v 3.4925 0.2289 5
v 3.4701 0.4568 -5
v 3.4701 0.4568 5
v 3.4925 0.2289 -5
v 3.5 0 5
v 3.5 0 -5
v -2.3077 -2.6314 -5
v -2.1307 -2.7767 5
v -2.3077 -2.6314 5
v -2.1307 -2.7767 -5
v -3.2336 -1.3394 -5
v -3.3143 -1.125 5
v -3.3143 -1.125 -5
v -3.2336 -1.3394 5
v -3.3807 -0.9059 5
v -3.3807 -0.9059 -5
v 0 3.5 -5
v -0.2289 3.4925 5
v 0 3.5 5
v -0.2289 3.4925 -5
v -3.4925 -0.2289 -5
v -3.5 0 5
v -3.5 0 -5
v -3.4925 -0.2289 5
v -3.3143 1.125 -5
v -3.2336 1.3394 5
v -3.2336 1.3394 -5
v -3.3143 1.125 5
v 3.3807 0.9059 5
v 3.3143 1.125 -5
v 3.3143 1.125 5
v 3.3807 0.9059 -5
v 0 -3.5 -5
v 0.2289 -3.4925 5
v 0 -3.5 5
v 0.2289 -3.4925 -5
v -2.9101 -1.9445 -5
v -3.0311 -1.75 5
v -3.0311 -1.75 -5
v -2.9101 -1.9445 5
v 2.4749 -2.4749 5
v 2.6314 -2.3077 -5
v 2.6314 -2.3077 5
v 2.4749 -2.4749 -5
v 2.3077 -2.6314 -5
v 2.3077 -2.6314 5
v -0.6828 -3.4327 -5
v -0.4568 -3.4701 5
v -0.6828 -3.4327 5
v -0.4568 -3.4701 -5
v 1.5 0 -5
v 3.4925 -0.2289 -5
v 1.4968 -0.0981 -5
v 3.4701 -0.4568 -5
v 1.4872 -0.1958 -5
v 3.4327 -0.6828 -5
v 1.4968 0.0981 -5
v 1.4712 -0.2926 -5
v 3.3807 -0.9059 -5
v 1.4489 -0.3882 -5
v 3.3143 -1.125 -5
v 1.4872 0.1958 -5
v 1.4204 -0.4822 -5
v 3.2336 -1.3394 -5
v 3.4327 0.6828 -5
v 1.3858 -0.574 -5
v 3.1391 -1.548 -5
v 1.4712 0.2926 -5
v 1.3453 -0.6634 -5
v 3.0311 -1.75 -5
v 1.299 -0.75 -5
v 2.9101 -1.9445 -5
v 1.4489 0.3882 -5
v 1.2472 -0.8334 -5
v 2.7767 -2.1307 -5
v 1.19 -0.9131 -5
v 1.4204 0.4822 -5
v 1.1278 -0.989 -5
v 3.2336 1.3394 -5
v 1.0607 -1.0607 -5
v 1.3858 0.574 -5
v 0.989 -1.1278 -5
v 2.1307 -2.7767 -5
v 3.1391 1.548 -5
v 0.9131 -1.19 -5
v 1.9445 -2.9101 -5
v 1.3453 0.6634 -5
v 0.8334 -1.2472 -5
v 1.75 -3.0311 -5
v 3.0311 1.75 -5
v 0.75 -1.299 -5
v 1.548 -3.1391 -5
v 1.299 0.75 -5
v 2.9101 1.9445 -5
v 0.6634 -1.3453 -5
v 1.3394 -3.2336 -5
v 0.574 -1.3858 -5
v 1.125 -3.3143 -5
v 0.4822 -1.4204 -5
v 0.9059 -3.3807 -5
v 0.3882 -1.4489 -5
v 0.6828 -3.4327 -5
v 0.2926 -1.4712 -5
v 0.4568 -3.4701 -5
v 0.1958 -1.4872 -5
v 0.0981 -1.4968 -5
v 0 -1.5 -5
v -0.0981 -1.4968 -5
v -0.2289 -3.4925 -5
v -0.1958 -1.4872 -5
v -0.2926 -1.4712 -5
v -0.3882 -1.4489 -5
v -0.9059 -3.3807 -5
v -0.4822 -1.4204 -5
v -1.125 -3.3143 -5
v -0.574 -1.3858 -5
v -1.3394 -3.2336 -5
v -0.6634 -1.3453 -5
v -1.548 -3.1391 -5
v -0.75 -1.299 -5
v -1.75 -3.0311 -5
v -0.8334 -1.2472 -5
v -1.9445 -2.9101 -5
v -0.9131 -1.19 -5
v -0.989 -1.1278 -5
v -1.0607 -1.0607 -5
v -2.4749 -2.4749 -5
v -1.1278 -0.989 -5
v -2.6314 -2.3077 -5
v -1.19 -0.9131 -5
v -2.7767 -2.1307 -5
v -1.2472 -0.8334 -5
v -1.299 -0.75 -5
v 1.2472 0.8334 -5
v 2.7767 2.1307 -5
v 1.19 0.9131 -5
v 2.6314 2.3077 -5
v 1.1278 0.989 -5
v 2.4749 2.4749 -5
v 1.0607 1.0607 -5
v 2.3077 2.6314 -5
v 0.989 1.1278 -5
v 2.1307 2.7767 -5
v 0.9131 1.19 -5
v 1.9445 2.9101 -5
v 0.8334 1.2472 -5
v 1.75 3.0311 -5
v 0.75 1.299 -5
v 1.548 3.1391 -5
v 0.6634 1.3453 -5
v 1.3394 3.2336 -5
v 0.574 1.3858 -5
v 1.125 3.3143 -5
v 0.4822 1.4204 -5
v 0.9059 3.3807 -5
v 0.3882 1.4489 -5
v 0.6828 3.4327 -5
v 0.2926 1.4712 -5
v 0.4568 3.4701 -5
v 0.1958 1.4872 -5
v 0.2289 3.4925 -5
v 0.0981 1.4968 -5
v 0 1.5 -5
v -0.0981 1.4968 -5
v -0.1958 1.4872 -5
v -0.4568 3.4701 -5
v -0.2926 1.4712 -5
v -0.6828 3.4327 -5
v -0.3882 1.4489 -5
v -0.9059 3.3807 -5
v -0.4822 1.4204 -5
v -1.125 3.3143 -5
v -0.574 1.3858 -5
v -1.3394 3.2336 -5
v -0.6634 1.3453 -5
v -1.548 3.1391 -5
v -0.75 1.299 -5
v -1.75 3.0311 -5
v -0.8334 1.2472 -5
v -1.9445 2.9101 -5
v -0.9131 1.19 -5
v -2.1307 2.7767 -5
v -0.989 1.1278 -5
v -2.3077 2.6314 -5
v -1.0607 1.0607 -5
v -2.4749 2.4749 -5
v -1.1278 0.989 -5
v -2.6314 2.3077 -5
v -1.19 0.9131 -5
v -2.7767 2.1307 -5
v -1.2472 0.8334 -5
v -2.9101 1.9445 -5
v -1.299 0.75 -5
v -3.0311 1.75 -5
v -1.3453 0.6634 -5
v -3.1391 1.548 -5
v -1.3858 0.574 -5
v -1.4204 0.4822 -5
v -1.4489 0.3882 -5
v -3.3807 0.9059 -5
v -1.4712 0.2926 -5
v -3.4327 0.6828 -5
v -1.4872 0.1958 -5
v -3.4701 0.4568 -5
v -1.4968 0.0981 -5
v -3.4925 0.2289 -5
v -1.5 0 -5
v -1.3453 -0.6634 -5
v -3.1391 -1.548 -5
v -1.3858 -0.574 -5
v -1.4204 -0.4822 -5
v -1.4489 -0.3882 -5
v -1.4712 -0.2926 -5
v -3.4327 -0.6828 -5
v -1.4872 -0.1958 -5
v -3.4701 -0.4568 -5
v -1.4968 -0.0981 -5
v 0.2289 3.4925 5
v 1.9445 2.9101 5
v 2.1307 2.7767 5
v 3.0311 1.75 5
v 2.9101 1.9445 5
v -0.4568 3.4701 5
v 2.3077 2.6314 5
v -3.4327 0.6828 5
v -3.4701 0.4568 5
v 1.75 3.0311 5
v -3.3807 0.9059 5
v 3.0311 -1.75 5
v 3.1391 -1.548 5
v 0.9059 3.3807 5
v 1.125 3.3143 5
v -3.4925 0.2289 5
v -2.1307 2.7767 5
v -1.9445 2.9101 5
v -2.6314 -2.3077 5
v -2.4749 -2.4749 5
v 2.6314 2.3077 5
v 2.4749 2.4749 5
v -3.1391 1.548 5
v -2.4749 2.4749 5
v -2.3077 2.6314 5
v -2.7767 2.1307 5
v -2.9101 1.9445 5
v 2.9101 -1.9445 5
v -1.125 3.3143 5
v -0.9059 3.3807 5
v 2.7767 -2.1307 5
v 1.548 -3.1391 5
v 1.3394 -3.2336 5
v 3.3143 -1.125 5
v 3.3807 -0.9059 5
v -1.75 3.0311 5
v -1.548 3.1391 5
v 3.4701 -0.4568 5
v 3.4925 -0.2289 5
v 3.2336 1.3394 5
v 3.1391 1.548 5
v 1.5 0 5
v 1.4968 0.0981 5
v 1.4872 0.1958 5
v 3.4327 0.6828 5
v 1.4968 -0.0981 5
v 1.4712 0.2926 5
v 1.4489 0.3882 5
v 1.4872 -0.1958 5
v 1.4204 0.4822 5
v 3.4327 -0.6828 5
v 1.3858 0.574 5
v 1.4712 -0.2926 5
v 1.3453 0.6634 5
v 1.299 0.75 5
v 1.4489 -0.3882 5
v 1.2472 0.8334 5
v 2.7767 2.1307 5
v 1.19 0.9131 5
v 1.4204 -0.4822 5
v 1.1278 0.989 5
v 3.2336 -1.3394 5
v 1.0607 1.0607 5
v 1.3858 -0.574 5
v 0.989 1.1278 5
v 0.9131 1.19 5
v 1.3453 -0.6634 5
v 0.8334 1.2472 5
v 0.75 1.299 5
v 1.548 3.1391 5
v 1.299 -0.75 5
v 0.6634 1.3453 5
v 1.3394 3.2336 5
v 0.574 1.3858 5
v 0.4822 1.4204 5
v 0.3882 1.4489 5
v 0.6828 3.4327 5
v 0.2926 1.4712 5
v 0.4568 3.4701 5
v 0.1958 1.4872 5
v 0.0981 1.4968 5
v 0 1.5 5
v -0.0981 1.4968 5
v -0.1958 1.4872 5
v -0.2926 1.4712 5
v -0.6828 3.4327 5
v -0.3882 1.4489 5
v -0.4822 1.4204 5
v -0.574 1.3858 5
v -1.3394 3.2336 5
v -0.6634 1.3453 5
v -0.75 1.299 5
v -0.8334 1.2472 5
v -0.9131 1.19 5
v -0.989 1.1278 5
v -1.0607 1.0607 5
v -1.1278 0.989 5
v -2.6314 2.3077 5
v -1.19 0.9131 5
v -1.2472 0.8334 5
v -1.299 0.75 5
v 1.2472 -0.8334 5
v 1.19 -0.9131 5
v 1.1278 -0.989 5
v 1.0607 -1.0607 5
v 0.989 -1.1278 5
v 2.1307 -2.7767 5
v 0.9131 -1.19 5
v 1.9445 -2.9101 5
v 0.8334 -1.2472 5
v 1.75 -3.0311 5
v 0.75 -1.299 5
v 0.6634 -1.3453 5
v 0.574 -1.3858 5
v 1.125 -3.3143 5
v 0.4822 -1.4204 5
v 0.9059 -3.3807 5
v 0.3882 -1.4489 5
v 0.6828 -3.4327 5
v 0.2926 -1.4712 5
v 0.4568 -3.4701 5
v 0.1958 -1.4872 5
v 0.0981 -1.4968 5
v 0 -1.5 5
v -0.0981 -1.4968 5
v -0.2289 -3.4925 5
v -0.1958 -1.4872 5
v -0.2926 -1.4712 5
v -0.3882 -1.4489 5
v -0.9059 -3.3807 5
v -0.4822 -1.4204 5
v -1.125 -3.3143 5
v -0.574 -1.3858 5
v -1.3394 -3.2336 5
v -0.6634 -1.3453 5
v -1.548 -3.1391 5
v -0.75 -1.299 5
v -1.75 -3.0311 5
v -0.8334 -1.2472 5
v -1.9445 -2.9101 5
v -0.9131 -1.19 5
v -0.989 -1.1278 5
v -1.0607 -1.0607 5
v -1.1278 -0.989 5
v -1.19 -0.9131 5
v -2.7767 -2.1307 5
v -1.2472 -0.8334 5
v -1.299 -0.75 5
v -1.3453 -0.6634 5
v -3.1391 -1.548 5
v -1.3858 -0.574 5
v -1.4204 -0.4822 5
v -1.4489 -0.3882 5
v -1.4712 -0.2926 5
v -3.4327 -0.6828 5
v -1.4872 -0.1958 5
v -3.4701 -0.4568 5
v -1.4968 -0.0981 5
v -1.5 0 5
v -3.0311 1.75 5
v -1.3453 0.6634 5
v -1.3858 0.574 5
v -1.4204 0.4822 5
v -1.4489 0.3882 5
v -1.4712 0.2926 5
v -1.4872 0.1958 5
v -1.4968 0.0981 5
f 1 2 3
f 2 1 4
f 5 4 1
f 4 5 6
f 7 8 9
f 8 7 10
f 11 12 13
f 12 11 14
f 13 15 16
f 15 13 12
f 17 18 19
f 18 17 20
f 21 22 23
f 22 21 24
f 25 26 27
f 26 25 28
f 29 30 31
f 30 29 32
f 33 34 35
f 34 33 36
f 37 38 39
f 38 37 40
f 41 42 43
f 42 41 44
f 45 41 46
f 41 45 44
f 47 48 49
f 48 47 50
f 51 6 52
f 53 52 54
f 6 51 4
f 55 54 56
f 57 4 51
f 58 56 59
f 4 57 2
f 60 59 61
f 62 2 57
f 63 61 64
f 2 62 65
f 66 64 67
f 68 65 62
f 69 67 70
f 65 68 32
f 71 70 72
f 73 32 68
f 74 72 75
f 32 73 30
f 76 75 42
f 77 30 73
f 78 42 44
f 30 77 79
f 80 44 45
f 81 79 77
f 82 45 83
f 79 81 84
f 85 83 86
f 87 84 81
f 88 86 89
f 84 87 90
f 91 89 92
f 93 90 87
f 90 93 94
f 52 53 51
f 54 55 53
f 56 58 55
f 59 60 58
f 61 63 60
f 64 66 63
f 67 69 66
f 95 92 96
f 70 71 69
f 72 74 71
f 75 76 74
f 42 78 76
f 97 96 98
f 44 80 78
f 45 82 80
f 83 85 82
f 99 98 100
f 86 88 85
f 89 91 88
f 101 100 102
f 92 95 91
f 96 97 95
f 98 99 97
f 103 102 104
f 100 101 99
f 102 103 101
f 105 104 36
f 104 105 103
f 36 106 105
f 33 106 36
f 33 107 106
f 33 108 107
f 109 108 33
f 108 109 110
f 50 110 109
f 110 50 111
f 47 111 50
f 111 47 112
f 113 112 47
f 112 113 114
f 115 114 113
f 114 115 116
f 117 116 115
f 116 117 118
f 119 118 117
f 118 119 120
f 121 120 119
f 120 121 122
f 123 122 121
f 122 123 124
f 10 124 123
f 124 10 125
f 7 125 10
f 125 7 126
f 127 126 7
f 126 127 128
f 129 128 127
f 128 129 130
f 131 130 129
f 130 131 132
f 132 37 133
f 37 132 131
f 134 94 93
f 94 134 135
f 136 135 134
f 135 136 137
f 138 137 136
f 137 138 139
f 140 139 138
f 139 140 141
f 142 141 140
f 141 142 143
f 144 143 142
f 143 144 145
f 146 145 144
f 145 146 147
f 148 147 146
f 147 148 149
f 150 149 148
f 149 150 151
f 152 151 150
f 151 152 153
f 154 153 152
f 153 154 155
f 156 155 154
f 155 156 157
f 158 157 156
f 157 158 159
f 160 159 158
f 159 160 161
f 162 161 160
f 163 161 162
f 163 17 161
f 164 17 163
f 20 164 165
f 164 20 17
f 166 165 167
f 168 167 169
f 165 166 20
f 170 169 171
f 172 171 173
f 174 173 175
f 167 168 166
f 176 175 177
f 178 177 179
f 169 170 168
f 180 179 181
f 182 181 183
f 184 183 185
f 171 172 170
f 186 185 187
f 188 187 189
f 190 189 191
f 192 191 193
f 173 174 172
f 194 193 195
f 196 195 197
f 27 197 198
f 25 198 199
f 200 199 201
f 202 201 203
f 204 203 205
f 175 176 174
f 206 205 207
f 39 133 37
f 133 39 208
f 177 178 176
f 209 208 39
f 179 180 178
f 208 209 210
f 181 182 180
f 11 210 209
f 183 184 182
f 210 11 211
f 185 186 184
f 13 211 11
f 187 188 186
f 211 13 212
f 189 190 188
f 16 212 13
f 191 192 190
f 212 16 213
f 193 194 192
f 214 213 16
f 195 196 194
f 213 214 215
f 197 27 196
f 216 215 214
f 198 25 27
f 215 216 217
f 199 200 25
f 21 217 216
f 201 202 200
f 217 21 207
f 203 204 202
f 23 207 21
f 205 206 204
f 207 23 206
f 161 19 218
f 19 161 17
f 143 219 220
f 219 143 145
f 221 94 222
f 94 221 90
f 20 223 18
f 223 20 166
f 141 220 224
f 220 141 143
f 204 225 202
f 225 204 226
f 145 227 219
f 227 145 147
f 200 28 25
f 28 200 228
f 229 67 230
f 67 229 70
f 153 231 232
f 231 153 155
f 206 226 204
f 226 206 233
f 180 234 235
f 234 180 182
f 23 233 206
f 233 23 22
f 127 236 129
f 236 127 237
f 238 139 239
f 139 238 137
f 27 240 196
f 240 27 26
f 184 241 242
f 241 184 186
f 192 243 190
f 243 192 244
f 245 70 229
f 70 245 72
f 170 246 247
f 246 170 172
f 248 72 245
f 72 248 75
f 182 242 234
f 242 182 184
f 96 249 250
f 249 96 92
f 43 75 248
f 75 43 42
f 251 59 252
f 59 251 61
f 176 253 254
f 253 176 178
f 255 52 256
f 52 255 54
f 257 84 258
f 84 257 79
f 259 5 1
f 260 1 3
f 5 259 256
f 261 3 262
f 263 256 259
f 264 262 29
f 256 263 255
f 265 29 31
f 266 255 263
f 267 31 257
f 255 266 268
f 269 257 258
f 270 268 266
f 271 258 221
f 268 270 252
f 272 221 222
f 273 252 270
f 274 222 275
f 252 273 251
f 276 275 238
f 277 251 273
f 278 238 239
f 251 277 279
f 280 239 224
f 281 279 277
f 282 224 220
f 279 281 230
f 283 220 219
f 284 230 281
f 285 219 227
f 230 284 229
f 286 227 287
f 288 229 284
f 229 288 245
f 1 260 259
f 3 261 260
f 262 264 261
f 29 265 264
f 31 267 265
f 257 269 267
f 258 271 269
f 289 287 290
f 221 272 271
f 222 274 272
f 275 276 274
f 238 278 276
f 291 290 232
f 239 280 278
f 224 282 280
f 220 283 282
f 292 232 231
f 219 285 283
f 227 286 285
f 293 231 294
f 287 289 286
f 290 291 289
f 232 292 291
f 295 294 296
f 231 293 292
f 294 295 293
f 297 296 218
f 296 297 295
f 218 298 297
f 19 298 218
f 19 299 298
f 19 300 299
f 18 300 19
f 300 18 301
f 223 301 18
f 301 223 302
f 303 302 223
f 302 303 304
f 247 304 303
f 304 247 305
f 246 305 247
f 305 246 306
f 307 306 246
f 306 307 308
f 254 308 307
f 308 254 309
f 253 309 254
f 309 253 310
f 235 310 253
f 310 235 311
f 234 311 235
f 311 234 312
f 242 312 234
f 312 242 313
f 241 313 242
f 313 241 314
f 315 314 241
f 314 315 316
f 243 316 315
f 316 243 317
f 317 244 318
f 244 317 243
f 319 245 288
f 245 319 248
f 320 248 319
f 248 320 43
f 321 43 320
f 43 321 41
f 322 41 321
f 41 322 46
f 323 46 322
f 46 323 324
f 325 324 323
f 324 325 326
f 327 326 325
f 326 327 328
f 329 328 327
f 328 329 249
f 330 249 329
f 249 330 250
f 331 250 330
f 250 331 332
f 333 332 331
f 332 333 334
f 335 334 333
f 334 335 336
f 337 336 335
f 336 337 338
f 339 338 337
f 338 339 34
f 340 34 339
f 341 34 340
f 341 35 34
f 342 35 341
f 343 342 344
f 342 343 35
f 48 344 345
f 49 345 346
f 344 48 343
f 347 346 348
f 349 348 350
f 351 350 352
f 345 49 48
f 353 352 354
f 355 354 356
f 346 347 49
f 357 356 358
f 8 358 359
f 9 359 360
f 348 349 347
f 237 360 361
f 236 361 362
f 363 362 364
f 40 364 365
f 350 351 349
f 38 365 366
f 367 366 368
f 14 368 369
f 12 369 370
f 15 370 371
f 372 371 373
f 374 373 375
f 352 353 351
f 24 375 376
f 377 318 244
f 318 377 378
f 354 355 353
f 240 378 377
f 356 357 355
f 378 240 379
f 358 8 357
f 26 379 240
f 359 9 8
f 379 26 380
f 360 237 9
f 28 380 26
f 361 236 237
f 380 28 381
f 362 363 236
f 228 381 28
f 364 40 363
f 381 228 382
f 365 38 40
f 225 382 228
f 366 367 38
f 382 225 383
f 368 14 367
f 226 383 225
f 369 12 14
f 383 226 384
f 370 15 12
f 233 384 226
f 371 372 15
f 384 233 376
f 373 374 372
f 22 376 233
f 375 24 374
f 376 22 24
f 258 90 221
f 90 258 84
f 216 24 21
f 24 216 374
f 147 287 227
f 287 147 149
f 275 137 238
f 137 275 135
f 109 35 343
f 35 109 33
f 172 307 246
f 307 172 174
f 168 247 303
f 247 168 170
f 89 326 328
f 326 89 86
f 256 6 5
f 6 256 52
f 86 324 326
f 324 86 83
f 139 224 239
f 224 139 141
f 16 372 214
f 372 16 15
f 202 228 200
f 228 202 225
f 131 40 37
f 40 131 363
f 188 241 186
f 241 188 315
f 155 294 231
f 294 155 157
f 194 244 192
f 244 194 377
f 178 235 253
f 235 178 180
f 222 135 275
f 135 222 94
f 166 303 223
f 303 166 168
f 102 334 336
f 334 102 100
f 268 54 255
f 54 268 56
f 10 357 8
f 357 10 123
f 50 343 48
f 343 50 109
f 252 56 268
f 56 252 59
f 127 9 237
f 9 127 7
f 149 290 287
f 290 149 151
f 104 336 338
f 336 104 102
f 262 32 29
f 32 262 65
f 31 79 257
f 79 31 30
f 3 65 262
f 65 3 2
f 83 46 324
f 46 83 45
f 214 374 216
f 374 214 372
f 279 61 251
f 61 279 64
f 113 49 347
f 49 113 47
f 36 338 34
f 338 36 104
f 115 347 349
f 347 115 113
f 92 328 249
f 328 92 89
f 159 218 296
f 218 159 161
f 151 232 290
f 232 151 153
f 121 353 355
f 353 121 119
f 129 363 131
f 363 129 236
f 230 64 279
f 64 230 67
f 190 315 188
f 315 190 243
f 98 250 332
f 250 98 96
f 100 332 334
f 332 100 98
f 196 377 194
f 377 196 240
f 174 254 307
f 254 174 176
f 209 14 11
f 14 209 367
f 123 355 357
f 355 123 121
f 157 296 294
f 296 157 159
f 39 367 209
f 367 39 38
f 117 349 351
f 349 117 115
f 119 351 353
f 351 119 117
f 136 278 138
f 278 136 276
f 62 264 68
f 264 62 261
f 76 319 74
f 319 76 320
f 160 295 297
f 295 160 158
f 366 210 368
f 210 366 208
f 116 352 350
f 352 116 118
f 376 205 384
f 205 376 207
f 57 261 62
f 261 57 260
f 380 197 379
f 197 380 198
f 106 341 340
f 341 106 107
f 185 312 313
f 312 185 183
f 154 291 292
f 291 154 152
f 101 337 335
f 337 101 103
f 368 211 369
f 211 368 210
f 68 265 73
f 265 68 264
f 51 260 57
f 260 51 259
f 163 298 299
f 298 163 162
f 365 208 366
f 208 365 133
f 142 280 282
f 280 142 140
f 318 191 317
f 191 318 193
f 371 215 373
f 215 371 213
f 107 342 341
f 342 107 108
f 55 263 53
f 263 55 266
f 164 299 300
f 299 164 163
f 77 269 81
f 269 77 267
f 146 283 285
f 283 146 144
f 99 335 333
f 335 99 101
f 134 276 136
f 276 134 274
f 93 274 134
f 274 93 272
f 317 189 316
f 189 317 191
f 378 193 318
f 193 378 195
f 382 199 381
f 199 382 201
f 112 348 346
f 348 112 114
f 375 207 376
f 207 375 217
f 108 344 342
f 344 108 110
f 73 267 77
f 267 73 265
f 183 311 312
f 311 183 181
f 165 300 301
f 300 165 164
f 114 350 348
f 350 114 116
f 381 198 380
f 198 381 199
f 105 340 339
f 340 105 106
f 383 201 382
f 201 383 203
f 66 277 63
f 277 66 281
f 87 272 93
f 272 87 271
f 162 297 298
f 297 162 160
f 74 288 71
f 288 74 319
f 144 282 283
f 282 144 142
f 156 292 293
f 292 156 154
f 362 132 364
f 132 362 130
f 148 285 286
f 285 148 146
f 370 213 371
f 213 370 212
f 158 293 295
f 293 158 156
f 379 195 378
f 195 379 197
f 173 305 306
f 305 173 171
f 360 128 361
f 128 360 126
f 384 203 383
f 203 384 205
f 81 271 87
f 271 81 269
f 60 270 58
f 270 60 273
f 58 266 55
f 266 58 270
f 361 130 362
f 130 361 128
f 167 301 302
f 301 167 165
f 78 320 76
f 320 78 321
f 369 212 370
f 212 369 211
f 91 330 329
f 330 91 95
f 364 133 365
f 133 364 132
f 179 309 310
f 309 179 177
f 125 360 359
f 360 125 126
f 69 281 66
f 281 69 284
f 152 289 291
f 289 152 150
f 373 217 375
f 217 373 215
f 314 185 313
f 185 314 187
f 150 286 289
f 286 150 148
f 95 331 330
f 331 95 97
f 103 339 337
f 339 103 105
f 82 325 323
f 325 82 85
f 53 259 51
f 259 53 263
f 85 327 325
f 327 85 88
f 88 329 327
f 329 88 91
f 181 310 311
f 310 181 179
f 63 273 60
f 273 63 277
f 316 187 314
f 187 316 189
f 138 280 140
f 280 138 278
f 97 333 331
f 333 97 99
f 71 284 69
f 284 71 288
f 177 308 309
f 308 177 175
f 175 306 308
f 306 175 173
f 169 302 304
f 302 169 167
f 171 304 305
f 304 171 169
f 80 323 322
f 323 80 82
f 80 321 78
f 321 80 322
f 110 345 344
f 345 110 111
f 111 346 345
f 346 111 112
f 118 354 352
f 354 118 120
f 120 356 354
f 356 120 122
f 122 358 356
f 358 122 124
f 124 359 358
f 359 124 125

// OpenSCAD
$fn = 96;

// Linear bearing dimensions (mm)
id = 3.0;     // bore diameter
od = 7.0;     // outer diameter
len = 10.0;   // overall length

// Small epsilon to guarantee clean boolean operations
eps = 0.02;

module linear_bearing(id, od, len) {
    difference() {
        // Outer sleeve
        cylinder(h = len, d = od, center = true);

        // Through-bore (slightly longer to ensure it fully cuts)
        cylinder(h = len + 2*eps, d = id, center = true);
    }
}

linear_bearing(id, od, len);
